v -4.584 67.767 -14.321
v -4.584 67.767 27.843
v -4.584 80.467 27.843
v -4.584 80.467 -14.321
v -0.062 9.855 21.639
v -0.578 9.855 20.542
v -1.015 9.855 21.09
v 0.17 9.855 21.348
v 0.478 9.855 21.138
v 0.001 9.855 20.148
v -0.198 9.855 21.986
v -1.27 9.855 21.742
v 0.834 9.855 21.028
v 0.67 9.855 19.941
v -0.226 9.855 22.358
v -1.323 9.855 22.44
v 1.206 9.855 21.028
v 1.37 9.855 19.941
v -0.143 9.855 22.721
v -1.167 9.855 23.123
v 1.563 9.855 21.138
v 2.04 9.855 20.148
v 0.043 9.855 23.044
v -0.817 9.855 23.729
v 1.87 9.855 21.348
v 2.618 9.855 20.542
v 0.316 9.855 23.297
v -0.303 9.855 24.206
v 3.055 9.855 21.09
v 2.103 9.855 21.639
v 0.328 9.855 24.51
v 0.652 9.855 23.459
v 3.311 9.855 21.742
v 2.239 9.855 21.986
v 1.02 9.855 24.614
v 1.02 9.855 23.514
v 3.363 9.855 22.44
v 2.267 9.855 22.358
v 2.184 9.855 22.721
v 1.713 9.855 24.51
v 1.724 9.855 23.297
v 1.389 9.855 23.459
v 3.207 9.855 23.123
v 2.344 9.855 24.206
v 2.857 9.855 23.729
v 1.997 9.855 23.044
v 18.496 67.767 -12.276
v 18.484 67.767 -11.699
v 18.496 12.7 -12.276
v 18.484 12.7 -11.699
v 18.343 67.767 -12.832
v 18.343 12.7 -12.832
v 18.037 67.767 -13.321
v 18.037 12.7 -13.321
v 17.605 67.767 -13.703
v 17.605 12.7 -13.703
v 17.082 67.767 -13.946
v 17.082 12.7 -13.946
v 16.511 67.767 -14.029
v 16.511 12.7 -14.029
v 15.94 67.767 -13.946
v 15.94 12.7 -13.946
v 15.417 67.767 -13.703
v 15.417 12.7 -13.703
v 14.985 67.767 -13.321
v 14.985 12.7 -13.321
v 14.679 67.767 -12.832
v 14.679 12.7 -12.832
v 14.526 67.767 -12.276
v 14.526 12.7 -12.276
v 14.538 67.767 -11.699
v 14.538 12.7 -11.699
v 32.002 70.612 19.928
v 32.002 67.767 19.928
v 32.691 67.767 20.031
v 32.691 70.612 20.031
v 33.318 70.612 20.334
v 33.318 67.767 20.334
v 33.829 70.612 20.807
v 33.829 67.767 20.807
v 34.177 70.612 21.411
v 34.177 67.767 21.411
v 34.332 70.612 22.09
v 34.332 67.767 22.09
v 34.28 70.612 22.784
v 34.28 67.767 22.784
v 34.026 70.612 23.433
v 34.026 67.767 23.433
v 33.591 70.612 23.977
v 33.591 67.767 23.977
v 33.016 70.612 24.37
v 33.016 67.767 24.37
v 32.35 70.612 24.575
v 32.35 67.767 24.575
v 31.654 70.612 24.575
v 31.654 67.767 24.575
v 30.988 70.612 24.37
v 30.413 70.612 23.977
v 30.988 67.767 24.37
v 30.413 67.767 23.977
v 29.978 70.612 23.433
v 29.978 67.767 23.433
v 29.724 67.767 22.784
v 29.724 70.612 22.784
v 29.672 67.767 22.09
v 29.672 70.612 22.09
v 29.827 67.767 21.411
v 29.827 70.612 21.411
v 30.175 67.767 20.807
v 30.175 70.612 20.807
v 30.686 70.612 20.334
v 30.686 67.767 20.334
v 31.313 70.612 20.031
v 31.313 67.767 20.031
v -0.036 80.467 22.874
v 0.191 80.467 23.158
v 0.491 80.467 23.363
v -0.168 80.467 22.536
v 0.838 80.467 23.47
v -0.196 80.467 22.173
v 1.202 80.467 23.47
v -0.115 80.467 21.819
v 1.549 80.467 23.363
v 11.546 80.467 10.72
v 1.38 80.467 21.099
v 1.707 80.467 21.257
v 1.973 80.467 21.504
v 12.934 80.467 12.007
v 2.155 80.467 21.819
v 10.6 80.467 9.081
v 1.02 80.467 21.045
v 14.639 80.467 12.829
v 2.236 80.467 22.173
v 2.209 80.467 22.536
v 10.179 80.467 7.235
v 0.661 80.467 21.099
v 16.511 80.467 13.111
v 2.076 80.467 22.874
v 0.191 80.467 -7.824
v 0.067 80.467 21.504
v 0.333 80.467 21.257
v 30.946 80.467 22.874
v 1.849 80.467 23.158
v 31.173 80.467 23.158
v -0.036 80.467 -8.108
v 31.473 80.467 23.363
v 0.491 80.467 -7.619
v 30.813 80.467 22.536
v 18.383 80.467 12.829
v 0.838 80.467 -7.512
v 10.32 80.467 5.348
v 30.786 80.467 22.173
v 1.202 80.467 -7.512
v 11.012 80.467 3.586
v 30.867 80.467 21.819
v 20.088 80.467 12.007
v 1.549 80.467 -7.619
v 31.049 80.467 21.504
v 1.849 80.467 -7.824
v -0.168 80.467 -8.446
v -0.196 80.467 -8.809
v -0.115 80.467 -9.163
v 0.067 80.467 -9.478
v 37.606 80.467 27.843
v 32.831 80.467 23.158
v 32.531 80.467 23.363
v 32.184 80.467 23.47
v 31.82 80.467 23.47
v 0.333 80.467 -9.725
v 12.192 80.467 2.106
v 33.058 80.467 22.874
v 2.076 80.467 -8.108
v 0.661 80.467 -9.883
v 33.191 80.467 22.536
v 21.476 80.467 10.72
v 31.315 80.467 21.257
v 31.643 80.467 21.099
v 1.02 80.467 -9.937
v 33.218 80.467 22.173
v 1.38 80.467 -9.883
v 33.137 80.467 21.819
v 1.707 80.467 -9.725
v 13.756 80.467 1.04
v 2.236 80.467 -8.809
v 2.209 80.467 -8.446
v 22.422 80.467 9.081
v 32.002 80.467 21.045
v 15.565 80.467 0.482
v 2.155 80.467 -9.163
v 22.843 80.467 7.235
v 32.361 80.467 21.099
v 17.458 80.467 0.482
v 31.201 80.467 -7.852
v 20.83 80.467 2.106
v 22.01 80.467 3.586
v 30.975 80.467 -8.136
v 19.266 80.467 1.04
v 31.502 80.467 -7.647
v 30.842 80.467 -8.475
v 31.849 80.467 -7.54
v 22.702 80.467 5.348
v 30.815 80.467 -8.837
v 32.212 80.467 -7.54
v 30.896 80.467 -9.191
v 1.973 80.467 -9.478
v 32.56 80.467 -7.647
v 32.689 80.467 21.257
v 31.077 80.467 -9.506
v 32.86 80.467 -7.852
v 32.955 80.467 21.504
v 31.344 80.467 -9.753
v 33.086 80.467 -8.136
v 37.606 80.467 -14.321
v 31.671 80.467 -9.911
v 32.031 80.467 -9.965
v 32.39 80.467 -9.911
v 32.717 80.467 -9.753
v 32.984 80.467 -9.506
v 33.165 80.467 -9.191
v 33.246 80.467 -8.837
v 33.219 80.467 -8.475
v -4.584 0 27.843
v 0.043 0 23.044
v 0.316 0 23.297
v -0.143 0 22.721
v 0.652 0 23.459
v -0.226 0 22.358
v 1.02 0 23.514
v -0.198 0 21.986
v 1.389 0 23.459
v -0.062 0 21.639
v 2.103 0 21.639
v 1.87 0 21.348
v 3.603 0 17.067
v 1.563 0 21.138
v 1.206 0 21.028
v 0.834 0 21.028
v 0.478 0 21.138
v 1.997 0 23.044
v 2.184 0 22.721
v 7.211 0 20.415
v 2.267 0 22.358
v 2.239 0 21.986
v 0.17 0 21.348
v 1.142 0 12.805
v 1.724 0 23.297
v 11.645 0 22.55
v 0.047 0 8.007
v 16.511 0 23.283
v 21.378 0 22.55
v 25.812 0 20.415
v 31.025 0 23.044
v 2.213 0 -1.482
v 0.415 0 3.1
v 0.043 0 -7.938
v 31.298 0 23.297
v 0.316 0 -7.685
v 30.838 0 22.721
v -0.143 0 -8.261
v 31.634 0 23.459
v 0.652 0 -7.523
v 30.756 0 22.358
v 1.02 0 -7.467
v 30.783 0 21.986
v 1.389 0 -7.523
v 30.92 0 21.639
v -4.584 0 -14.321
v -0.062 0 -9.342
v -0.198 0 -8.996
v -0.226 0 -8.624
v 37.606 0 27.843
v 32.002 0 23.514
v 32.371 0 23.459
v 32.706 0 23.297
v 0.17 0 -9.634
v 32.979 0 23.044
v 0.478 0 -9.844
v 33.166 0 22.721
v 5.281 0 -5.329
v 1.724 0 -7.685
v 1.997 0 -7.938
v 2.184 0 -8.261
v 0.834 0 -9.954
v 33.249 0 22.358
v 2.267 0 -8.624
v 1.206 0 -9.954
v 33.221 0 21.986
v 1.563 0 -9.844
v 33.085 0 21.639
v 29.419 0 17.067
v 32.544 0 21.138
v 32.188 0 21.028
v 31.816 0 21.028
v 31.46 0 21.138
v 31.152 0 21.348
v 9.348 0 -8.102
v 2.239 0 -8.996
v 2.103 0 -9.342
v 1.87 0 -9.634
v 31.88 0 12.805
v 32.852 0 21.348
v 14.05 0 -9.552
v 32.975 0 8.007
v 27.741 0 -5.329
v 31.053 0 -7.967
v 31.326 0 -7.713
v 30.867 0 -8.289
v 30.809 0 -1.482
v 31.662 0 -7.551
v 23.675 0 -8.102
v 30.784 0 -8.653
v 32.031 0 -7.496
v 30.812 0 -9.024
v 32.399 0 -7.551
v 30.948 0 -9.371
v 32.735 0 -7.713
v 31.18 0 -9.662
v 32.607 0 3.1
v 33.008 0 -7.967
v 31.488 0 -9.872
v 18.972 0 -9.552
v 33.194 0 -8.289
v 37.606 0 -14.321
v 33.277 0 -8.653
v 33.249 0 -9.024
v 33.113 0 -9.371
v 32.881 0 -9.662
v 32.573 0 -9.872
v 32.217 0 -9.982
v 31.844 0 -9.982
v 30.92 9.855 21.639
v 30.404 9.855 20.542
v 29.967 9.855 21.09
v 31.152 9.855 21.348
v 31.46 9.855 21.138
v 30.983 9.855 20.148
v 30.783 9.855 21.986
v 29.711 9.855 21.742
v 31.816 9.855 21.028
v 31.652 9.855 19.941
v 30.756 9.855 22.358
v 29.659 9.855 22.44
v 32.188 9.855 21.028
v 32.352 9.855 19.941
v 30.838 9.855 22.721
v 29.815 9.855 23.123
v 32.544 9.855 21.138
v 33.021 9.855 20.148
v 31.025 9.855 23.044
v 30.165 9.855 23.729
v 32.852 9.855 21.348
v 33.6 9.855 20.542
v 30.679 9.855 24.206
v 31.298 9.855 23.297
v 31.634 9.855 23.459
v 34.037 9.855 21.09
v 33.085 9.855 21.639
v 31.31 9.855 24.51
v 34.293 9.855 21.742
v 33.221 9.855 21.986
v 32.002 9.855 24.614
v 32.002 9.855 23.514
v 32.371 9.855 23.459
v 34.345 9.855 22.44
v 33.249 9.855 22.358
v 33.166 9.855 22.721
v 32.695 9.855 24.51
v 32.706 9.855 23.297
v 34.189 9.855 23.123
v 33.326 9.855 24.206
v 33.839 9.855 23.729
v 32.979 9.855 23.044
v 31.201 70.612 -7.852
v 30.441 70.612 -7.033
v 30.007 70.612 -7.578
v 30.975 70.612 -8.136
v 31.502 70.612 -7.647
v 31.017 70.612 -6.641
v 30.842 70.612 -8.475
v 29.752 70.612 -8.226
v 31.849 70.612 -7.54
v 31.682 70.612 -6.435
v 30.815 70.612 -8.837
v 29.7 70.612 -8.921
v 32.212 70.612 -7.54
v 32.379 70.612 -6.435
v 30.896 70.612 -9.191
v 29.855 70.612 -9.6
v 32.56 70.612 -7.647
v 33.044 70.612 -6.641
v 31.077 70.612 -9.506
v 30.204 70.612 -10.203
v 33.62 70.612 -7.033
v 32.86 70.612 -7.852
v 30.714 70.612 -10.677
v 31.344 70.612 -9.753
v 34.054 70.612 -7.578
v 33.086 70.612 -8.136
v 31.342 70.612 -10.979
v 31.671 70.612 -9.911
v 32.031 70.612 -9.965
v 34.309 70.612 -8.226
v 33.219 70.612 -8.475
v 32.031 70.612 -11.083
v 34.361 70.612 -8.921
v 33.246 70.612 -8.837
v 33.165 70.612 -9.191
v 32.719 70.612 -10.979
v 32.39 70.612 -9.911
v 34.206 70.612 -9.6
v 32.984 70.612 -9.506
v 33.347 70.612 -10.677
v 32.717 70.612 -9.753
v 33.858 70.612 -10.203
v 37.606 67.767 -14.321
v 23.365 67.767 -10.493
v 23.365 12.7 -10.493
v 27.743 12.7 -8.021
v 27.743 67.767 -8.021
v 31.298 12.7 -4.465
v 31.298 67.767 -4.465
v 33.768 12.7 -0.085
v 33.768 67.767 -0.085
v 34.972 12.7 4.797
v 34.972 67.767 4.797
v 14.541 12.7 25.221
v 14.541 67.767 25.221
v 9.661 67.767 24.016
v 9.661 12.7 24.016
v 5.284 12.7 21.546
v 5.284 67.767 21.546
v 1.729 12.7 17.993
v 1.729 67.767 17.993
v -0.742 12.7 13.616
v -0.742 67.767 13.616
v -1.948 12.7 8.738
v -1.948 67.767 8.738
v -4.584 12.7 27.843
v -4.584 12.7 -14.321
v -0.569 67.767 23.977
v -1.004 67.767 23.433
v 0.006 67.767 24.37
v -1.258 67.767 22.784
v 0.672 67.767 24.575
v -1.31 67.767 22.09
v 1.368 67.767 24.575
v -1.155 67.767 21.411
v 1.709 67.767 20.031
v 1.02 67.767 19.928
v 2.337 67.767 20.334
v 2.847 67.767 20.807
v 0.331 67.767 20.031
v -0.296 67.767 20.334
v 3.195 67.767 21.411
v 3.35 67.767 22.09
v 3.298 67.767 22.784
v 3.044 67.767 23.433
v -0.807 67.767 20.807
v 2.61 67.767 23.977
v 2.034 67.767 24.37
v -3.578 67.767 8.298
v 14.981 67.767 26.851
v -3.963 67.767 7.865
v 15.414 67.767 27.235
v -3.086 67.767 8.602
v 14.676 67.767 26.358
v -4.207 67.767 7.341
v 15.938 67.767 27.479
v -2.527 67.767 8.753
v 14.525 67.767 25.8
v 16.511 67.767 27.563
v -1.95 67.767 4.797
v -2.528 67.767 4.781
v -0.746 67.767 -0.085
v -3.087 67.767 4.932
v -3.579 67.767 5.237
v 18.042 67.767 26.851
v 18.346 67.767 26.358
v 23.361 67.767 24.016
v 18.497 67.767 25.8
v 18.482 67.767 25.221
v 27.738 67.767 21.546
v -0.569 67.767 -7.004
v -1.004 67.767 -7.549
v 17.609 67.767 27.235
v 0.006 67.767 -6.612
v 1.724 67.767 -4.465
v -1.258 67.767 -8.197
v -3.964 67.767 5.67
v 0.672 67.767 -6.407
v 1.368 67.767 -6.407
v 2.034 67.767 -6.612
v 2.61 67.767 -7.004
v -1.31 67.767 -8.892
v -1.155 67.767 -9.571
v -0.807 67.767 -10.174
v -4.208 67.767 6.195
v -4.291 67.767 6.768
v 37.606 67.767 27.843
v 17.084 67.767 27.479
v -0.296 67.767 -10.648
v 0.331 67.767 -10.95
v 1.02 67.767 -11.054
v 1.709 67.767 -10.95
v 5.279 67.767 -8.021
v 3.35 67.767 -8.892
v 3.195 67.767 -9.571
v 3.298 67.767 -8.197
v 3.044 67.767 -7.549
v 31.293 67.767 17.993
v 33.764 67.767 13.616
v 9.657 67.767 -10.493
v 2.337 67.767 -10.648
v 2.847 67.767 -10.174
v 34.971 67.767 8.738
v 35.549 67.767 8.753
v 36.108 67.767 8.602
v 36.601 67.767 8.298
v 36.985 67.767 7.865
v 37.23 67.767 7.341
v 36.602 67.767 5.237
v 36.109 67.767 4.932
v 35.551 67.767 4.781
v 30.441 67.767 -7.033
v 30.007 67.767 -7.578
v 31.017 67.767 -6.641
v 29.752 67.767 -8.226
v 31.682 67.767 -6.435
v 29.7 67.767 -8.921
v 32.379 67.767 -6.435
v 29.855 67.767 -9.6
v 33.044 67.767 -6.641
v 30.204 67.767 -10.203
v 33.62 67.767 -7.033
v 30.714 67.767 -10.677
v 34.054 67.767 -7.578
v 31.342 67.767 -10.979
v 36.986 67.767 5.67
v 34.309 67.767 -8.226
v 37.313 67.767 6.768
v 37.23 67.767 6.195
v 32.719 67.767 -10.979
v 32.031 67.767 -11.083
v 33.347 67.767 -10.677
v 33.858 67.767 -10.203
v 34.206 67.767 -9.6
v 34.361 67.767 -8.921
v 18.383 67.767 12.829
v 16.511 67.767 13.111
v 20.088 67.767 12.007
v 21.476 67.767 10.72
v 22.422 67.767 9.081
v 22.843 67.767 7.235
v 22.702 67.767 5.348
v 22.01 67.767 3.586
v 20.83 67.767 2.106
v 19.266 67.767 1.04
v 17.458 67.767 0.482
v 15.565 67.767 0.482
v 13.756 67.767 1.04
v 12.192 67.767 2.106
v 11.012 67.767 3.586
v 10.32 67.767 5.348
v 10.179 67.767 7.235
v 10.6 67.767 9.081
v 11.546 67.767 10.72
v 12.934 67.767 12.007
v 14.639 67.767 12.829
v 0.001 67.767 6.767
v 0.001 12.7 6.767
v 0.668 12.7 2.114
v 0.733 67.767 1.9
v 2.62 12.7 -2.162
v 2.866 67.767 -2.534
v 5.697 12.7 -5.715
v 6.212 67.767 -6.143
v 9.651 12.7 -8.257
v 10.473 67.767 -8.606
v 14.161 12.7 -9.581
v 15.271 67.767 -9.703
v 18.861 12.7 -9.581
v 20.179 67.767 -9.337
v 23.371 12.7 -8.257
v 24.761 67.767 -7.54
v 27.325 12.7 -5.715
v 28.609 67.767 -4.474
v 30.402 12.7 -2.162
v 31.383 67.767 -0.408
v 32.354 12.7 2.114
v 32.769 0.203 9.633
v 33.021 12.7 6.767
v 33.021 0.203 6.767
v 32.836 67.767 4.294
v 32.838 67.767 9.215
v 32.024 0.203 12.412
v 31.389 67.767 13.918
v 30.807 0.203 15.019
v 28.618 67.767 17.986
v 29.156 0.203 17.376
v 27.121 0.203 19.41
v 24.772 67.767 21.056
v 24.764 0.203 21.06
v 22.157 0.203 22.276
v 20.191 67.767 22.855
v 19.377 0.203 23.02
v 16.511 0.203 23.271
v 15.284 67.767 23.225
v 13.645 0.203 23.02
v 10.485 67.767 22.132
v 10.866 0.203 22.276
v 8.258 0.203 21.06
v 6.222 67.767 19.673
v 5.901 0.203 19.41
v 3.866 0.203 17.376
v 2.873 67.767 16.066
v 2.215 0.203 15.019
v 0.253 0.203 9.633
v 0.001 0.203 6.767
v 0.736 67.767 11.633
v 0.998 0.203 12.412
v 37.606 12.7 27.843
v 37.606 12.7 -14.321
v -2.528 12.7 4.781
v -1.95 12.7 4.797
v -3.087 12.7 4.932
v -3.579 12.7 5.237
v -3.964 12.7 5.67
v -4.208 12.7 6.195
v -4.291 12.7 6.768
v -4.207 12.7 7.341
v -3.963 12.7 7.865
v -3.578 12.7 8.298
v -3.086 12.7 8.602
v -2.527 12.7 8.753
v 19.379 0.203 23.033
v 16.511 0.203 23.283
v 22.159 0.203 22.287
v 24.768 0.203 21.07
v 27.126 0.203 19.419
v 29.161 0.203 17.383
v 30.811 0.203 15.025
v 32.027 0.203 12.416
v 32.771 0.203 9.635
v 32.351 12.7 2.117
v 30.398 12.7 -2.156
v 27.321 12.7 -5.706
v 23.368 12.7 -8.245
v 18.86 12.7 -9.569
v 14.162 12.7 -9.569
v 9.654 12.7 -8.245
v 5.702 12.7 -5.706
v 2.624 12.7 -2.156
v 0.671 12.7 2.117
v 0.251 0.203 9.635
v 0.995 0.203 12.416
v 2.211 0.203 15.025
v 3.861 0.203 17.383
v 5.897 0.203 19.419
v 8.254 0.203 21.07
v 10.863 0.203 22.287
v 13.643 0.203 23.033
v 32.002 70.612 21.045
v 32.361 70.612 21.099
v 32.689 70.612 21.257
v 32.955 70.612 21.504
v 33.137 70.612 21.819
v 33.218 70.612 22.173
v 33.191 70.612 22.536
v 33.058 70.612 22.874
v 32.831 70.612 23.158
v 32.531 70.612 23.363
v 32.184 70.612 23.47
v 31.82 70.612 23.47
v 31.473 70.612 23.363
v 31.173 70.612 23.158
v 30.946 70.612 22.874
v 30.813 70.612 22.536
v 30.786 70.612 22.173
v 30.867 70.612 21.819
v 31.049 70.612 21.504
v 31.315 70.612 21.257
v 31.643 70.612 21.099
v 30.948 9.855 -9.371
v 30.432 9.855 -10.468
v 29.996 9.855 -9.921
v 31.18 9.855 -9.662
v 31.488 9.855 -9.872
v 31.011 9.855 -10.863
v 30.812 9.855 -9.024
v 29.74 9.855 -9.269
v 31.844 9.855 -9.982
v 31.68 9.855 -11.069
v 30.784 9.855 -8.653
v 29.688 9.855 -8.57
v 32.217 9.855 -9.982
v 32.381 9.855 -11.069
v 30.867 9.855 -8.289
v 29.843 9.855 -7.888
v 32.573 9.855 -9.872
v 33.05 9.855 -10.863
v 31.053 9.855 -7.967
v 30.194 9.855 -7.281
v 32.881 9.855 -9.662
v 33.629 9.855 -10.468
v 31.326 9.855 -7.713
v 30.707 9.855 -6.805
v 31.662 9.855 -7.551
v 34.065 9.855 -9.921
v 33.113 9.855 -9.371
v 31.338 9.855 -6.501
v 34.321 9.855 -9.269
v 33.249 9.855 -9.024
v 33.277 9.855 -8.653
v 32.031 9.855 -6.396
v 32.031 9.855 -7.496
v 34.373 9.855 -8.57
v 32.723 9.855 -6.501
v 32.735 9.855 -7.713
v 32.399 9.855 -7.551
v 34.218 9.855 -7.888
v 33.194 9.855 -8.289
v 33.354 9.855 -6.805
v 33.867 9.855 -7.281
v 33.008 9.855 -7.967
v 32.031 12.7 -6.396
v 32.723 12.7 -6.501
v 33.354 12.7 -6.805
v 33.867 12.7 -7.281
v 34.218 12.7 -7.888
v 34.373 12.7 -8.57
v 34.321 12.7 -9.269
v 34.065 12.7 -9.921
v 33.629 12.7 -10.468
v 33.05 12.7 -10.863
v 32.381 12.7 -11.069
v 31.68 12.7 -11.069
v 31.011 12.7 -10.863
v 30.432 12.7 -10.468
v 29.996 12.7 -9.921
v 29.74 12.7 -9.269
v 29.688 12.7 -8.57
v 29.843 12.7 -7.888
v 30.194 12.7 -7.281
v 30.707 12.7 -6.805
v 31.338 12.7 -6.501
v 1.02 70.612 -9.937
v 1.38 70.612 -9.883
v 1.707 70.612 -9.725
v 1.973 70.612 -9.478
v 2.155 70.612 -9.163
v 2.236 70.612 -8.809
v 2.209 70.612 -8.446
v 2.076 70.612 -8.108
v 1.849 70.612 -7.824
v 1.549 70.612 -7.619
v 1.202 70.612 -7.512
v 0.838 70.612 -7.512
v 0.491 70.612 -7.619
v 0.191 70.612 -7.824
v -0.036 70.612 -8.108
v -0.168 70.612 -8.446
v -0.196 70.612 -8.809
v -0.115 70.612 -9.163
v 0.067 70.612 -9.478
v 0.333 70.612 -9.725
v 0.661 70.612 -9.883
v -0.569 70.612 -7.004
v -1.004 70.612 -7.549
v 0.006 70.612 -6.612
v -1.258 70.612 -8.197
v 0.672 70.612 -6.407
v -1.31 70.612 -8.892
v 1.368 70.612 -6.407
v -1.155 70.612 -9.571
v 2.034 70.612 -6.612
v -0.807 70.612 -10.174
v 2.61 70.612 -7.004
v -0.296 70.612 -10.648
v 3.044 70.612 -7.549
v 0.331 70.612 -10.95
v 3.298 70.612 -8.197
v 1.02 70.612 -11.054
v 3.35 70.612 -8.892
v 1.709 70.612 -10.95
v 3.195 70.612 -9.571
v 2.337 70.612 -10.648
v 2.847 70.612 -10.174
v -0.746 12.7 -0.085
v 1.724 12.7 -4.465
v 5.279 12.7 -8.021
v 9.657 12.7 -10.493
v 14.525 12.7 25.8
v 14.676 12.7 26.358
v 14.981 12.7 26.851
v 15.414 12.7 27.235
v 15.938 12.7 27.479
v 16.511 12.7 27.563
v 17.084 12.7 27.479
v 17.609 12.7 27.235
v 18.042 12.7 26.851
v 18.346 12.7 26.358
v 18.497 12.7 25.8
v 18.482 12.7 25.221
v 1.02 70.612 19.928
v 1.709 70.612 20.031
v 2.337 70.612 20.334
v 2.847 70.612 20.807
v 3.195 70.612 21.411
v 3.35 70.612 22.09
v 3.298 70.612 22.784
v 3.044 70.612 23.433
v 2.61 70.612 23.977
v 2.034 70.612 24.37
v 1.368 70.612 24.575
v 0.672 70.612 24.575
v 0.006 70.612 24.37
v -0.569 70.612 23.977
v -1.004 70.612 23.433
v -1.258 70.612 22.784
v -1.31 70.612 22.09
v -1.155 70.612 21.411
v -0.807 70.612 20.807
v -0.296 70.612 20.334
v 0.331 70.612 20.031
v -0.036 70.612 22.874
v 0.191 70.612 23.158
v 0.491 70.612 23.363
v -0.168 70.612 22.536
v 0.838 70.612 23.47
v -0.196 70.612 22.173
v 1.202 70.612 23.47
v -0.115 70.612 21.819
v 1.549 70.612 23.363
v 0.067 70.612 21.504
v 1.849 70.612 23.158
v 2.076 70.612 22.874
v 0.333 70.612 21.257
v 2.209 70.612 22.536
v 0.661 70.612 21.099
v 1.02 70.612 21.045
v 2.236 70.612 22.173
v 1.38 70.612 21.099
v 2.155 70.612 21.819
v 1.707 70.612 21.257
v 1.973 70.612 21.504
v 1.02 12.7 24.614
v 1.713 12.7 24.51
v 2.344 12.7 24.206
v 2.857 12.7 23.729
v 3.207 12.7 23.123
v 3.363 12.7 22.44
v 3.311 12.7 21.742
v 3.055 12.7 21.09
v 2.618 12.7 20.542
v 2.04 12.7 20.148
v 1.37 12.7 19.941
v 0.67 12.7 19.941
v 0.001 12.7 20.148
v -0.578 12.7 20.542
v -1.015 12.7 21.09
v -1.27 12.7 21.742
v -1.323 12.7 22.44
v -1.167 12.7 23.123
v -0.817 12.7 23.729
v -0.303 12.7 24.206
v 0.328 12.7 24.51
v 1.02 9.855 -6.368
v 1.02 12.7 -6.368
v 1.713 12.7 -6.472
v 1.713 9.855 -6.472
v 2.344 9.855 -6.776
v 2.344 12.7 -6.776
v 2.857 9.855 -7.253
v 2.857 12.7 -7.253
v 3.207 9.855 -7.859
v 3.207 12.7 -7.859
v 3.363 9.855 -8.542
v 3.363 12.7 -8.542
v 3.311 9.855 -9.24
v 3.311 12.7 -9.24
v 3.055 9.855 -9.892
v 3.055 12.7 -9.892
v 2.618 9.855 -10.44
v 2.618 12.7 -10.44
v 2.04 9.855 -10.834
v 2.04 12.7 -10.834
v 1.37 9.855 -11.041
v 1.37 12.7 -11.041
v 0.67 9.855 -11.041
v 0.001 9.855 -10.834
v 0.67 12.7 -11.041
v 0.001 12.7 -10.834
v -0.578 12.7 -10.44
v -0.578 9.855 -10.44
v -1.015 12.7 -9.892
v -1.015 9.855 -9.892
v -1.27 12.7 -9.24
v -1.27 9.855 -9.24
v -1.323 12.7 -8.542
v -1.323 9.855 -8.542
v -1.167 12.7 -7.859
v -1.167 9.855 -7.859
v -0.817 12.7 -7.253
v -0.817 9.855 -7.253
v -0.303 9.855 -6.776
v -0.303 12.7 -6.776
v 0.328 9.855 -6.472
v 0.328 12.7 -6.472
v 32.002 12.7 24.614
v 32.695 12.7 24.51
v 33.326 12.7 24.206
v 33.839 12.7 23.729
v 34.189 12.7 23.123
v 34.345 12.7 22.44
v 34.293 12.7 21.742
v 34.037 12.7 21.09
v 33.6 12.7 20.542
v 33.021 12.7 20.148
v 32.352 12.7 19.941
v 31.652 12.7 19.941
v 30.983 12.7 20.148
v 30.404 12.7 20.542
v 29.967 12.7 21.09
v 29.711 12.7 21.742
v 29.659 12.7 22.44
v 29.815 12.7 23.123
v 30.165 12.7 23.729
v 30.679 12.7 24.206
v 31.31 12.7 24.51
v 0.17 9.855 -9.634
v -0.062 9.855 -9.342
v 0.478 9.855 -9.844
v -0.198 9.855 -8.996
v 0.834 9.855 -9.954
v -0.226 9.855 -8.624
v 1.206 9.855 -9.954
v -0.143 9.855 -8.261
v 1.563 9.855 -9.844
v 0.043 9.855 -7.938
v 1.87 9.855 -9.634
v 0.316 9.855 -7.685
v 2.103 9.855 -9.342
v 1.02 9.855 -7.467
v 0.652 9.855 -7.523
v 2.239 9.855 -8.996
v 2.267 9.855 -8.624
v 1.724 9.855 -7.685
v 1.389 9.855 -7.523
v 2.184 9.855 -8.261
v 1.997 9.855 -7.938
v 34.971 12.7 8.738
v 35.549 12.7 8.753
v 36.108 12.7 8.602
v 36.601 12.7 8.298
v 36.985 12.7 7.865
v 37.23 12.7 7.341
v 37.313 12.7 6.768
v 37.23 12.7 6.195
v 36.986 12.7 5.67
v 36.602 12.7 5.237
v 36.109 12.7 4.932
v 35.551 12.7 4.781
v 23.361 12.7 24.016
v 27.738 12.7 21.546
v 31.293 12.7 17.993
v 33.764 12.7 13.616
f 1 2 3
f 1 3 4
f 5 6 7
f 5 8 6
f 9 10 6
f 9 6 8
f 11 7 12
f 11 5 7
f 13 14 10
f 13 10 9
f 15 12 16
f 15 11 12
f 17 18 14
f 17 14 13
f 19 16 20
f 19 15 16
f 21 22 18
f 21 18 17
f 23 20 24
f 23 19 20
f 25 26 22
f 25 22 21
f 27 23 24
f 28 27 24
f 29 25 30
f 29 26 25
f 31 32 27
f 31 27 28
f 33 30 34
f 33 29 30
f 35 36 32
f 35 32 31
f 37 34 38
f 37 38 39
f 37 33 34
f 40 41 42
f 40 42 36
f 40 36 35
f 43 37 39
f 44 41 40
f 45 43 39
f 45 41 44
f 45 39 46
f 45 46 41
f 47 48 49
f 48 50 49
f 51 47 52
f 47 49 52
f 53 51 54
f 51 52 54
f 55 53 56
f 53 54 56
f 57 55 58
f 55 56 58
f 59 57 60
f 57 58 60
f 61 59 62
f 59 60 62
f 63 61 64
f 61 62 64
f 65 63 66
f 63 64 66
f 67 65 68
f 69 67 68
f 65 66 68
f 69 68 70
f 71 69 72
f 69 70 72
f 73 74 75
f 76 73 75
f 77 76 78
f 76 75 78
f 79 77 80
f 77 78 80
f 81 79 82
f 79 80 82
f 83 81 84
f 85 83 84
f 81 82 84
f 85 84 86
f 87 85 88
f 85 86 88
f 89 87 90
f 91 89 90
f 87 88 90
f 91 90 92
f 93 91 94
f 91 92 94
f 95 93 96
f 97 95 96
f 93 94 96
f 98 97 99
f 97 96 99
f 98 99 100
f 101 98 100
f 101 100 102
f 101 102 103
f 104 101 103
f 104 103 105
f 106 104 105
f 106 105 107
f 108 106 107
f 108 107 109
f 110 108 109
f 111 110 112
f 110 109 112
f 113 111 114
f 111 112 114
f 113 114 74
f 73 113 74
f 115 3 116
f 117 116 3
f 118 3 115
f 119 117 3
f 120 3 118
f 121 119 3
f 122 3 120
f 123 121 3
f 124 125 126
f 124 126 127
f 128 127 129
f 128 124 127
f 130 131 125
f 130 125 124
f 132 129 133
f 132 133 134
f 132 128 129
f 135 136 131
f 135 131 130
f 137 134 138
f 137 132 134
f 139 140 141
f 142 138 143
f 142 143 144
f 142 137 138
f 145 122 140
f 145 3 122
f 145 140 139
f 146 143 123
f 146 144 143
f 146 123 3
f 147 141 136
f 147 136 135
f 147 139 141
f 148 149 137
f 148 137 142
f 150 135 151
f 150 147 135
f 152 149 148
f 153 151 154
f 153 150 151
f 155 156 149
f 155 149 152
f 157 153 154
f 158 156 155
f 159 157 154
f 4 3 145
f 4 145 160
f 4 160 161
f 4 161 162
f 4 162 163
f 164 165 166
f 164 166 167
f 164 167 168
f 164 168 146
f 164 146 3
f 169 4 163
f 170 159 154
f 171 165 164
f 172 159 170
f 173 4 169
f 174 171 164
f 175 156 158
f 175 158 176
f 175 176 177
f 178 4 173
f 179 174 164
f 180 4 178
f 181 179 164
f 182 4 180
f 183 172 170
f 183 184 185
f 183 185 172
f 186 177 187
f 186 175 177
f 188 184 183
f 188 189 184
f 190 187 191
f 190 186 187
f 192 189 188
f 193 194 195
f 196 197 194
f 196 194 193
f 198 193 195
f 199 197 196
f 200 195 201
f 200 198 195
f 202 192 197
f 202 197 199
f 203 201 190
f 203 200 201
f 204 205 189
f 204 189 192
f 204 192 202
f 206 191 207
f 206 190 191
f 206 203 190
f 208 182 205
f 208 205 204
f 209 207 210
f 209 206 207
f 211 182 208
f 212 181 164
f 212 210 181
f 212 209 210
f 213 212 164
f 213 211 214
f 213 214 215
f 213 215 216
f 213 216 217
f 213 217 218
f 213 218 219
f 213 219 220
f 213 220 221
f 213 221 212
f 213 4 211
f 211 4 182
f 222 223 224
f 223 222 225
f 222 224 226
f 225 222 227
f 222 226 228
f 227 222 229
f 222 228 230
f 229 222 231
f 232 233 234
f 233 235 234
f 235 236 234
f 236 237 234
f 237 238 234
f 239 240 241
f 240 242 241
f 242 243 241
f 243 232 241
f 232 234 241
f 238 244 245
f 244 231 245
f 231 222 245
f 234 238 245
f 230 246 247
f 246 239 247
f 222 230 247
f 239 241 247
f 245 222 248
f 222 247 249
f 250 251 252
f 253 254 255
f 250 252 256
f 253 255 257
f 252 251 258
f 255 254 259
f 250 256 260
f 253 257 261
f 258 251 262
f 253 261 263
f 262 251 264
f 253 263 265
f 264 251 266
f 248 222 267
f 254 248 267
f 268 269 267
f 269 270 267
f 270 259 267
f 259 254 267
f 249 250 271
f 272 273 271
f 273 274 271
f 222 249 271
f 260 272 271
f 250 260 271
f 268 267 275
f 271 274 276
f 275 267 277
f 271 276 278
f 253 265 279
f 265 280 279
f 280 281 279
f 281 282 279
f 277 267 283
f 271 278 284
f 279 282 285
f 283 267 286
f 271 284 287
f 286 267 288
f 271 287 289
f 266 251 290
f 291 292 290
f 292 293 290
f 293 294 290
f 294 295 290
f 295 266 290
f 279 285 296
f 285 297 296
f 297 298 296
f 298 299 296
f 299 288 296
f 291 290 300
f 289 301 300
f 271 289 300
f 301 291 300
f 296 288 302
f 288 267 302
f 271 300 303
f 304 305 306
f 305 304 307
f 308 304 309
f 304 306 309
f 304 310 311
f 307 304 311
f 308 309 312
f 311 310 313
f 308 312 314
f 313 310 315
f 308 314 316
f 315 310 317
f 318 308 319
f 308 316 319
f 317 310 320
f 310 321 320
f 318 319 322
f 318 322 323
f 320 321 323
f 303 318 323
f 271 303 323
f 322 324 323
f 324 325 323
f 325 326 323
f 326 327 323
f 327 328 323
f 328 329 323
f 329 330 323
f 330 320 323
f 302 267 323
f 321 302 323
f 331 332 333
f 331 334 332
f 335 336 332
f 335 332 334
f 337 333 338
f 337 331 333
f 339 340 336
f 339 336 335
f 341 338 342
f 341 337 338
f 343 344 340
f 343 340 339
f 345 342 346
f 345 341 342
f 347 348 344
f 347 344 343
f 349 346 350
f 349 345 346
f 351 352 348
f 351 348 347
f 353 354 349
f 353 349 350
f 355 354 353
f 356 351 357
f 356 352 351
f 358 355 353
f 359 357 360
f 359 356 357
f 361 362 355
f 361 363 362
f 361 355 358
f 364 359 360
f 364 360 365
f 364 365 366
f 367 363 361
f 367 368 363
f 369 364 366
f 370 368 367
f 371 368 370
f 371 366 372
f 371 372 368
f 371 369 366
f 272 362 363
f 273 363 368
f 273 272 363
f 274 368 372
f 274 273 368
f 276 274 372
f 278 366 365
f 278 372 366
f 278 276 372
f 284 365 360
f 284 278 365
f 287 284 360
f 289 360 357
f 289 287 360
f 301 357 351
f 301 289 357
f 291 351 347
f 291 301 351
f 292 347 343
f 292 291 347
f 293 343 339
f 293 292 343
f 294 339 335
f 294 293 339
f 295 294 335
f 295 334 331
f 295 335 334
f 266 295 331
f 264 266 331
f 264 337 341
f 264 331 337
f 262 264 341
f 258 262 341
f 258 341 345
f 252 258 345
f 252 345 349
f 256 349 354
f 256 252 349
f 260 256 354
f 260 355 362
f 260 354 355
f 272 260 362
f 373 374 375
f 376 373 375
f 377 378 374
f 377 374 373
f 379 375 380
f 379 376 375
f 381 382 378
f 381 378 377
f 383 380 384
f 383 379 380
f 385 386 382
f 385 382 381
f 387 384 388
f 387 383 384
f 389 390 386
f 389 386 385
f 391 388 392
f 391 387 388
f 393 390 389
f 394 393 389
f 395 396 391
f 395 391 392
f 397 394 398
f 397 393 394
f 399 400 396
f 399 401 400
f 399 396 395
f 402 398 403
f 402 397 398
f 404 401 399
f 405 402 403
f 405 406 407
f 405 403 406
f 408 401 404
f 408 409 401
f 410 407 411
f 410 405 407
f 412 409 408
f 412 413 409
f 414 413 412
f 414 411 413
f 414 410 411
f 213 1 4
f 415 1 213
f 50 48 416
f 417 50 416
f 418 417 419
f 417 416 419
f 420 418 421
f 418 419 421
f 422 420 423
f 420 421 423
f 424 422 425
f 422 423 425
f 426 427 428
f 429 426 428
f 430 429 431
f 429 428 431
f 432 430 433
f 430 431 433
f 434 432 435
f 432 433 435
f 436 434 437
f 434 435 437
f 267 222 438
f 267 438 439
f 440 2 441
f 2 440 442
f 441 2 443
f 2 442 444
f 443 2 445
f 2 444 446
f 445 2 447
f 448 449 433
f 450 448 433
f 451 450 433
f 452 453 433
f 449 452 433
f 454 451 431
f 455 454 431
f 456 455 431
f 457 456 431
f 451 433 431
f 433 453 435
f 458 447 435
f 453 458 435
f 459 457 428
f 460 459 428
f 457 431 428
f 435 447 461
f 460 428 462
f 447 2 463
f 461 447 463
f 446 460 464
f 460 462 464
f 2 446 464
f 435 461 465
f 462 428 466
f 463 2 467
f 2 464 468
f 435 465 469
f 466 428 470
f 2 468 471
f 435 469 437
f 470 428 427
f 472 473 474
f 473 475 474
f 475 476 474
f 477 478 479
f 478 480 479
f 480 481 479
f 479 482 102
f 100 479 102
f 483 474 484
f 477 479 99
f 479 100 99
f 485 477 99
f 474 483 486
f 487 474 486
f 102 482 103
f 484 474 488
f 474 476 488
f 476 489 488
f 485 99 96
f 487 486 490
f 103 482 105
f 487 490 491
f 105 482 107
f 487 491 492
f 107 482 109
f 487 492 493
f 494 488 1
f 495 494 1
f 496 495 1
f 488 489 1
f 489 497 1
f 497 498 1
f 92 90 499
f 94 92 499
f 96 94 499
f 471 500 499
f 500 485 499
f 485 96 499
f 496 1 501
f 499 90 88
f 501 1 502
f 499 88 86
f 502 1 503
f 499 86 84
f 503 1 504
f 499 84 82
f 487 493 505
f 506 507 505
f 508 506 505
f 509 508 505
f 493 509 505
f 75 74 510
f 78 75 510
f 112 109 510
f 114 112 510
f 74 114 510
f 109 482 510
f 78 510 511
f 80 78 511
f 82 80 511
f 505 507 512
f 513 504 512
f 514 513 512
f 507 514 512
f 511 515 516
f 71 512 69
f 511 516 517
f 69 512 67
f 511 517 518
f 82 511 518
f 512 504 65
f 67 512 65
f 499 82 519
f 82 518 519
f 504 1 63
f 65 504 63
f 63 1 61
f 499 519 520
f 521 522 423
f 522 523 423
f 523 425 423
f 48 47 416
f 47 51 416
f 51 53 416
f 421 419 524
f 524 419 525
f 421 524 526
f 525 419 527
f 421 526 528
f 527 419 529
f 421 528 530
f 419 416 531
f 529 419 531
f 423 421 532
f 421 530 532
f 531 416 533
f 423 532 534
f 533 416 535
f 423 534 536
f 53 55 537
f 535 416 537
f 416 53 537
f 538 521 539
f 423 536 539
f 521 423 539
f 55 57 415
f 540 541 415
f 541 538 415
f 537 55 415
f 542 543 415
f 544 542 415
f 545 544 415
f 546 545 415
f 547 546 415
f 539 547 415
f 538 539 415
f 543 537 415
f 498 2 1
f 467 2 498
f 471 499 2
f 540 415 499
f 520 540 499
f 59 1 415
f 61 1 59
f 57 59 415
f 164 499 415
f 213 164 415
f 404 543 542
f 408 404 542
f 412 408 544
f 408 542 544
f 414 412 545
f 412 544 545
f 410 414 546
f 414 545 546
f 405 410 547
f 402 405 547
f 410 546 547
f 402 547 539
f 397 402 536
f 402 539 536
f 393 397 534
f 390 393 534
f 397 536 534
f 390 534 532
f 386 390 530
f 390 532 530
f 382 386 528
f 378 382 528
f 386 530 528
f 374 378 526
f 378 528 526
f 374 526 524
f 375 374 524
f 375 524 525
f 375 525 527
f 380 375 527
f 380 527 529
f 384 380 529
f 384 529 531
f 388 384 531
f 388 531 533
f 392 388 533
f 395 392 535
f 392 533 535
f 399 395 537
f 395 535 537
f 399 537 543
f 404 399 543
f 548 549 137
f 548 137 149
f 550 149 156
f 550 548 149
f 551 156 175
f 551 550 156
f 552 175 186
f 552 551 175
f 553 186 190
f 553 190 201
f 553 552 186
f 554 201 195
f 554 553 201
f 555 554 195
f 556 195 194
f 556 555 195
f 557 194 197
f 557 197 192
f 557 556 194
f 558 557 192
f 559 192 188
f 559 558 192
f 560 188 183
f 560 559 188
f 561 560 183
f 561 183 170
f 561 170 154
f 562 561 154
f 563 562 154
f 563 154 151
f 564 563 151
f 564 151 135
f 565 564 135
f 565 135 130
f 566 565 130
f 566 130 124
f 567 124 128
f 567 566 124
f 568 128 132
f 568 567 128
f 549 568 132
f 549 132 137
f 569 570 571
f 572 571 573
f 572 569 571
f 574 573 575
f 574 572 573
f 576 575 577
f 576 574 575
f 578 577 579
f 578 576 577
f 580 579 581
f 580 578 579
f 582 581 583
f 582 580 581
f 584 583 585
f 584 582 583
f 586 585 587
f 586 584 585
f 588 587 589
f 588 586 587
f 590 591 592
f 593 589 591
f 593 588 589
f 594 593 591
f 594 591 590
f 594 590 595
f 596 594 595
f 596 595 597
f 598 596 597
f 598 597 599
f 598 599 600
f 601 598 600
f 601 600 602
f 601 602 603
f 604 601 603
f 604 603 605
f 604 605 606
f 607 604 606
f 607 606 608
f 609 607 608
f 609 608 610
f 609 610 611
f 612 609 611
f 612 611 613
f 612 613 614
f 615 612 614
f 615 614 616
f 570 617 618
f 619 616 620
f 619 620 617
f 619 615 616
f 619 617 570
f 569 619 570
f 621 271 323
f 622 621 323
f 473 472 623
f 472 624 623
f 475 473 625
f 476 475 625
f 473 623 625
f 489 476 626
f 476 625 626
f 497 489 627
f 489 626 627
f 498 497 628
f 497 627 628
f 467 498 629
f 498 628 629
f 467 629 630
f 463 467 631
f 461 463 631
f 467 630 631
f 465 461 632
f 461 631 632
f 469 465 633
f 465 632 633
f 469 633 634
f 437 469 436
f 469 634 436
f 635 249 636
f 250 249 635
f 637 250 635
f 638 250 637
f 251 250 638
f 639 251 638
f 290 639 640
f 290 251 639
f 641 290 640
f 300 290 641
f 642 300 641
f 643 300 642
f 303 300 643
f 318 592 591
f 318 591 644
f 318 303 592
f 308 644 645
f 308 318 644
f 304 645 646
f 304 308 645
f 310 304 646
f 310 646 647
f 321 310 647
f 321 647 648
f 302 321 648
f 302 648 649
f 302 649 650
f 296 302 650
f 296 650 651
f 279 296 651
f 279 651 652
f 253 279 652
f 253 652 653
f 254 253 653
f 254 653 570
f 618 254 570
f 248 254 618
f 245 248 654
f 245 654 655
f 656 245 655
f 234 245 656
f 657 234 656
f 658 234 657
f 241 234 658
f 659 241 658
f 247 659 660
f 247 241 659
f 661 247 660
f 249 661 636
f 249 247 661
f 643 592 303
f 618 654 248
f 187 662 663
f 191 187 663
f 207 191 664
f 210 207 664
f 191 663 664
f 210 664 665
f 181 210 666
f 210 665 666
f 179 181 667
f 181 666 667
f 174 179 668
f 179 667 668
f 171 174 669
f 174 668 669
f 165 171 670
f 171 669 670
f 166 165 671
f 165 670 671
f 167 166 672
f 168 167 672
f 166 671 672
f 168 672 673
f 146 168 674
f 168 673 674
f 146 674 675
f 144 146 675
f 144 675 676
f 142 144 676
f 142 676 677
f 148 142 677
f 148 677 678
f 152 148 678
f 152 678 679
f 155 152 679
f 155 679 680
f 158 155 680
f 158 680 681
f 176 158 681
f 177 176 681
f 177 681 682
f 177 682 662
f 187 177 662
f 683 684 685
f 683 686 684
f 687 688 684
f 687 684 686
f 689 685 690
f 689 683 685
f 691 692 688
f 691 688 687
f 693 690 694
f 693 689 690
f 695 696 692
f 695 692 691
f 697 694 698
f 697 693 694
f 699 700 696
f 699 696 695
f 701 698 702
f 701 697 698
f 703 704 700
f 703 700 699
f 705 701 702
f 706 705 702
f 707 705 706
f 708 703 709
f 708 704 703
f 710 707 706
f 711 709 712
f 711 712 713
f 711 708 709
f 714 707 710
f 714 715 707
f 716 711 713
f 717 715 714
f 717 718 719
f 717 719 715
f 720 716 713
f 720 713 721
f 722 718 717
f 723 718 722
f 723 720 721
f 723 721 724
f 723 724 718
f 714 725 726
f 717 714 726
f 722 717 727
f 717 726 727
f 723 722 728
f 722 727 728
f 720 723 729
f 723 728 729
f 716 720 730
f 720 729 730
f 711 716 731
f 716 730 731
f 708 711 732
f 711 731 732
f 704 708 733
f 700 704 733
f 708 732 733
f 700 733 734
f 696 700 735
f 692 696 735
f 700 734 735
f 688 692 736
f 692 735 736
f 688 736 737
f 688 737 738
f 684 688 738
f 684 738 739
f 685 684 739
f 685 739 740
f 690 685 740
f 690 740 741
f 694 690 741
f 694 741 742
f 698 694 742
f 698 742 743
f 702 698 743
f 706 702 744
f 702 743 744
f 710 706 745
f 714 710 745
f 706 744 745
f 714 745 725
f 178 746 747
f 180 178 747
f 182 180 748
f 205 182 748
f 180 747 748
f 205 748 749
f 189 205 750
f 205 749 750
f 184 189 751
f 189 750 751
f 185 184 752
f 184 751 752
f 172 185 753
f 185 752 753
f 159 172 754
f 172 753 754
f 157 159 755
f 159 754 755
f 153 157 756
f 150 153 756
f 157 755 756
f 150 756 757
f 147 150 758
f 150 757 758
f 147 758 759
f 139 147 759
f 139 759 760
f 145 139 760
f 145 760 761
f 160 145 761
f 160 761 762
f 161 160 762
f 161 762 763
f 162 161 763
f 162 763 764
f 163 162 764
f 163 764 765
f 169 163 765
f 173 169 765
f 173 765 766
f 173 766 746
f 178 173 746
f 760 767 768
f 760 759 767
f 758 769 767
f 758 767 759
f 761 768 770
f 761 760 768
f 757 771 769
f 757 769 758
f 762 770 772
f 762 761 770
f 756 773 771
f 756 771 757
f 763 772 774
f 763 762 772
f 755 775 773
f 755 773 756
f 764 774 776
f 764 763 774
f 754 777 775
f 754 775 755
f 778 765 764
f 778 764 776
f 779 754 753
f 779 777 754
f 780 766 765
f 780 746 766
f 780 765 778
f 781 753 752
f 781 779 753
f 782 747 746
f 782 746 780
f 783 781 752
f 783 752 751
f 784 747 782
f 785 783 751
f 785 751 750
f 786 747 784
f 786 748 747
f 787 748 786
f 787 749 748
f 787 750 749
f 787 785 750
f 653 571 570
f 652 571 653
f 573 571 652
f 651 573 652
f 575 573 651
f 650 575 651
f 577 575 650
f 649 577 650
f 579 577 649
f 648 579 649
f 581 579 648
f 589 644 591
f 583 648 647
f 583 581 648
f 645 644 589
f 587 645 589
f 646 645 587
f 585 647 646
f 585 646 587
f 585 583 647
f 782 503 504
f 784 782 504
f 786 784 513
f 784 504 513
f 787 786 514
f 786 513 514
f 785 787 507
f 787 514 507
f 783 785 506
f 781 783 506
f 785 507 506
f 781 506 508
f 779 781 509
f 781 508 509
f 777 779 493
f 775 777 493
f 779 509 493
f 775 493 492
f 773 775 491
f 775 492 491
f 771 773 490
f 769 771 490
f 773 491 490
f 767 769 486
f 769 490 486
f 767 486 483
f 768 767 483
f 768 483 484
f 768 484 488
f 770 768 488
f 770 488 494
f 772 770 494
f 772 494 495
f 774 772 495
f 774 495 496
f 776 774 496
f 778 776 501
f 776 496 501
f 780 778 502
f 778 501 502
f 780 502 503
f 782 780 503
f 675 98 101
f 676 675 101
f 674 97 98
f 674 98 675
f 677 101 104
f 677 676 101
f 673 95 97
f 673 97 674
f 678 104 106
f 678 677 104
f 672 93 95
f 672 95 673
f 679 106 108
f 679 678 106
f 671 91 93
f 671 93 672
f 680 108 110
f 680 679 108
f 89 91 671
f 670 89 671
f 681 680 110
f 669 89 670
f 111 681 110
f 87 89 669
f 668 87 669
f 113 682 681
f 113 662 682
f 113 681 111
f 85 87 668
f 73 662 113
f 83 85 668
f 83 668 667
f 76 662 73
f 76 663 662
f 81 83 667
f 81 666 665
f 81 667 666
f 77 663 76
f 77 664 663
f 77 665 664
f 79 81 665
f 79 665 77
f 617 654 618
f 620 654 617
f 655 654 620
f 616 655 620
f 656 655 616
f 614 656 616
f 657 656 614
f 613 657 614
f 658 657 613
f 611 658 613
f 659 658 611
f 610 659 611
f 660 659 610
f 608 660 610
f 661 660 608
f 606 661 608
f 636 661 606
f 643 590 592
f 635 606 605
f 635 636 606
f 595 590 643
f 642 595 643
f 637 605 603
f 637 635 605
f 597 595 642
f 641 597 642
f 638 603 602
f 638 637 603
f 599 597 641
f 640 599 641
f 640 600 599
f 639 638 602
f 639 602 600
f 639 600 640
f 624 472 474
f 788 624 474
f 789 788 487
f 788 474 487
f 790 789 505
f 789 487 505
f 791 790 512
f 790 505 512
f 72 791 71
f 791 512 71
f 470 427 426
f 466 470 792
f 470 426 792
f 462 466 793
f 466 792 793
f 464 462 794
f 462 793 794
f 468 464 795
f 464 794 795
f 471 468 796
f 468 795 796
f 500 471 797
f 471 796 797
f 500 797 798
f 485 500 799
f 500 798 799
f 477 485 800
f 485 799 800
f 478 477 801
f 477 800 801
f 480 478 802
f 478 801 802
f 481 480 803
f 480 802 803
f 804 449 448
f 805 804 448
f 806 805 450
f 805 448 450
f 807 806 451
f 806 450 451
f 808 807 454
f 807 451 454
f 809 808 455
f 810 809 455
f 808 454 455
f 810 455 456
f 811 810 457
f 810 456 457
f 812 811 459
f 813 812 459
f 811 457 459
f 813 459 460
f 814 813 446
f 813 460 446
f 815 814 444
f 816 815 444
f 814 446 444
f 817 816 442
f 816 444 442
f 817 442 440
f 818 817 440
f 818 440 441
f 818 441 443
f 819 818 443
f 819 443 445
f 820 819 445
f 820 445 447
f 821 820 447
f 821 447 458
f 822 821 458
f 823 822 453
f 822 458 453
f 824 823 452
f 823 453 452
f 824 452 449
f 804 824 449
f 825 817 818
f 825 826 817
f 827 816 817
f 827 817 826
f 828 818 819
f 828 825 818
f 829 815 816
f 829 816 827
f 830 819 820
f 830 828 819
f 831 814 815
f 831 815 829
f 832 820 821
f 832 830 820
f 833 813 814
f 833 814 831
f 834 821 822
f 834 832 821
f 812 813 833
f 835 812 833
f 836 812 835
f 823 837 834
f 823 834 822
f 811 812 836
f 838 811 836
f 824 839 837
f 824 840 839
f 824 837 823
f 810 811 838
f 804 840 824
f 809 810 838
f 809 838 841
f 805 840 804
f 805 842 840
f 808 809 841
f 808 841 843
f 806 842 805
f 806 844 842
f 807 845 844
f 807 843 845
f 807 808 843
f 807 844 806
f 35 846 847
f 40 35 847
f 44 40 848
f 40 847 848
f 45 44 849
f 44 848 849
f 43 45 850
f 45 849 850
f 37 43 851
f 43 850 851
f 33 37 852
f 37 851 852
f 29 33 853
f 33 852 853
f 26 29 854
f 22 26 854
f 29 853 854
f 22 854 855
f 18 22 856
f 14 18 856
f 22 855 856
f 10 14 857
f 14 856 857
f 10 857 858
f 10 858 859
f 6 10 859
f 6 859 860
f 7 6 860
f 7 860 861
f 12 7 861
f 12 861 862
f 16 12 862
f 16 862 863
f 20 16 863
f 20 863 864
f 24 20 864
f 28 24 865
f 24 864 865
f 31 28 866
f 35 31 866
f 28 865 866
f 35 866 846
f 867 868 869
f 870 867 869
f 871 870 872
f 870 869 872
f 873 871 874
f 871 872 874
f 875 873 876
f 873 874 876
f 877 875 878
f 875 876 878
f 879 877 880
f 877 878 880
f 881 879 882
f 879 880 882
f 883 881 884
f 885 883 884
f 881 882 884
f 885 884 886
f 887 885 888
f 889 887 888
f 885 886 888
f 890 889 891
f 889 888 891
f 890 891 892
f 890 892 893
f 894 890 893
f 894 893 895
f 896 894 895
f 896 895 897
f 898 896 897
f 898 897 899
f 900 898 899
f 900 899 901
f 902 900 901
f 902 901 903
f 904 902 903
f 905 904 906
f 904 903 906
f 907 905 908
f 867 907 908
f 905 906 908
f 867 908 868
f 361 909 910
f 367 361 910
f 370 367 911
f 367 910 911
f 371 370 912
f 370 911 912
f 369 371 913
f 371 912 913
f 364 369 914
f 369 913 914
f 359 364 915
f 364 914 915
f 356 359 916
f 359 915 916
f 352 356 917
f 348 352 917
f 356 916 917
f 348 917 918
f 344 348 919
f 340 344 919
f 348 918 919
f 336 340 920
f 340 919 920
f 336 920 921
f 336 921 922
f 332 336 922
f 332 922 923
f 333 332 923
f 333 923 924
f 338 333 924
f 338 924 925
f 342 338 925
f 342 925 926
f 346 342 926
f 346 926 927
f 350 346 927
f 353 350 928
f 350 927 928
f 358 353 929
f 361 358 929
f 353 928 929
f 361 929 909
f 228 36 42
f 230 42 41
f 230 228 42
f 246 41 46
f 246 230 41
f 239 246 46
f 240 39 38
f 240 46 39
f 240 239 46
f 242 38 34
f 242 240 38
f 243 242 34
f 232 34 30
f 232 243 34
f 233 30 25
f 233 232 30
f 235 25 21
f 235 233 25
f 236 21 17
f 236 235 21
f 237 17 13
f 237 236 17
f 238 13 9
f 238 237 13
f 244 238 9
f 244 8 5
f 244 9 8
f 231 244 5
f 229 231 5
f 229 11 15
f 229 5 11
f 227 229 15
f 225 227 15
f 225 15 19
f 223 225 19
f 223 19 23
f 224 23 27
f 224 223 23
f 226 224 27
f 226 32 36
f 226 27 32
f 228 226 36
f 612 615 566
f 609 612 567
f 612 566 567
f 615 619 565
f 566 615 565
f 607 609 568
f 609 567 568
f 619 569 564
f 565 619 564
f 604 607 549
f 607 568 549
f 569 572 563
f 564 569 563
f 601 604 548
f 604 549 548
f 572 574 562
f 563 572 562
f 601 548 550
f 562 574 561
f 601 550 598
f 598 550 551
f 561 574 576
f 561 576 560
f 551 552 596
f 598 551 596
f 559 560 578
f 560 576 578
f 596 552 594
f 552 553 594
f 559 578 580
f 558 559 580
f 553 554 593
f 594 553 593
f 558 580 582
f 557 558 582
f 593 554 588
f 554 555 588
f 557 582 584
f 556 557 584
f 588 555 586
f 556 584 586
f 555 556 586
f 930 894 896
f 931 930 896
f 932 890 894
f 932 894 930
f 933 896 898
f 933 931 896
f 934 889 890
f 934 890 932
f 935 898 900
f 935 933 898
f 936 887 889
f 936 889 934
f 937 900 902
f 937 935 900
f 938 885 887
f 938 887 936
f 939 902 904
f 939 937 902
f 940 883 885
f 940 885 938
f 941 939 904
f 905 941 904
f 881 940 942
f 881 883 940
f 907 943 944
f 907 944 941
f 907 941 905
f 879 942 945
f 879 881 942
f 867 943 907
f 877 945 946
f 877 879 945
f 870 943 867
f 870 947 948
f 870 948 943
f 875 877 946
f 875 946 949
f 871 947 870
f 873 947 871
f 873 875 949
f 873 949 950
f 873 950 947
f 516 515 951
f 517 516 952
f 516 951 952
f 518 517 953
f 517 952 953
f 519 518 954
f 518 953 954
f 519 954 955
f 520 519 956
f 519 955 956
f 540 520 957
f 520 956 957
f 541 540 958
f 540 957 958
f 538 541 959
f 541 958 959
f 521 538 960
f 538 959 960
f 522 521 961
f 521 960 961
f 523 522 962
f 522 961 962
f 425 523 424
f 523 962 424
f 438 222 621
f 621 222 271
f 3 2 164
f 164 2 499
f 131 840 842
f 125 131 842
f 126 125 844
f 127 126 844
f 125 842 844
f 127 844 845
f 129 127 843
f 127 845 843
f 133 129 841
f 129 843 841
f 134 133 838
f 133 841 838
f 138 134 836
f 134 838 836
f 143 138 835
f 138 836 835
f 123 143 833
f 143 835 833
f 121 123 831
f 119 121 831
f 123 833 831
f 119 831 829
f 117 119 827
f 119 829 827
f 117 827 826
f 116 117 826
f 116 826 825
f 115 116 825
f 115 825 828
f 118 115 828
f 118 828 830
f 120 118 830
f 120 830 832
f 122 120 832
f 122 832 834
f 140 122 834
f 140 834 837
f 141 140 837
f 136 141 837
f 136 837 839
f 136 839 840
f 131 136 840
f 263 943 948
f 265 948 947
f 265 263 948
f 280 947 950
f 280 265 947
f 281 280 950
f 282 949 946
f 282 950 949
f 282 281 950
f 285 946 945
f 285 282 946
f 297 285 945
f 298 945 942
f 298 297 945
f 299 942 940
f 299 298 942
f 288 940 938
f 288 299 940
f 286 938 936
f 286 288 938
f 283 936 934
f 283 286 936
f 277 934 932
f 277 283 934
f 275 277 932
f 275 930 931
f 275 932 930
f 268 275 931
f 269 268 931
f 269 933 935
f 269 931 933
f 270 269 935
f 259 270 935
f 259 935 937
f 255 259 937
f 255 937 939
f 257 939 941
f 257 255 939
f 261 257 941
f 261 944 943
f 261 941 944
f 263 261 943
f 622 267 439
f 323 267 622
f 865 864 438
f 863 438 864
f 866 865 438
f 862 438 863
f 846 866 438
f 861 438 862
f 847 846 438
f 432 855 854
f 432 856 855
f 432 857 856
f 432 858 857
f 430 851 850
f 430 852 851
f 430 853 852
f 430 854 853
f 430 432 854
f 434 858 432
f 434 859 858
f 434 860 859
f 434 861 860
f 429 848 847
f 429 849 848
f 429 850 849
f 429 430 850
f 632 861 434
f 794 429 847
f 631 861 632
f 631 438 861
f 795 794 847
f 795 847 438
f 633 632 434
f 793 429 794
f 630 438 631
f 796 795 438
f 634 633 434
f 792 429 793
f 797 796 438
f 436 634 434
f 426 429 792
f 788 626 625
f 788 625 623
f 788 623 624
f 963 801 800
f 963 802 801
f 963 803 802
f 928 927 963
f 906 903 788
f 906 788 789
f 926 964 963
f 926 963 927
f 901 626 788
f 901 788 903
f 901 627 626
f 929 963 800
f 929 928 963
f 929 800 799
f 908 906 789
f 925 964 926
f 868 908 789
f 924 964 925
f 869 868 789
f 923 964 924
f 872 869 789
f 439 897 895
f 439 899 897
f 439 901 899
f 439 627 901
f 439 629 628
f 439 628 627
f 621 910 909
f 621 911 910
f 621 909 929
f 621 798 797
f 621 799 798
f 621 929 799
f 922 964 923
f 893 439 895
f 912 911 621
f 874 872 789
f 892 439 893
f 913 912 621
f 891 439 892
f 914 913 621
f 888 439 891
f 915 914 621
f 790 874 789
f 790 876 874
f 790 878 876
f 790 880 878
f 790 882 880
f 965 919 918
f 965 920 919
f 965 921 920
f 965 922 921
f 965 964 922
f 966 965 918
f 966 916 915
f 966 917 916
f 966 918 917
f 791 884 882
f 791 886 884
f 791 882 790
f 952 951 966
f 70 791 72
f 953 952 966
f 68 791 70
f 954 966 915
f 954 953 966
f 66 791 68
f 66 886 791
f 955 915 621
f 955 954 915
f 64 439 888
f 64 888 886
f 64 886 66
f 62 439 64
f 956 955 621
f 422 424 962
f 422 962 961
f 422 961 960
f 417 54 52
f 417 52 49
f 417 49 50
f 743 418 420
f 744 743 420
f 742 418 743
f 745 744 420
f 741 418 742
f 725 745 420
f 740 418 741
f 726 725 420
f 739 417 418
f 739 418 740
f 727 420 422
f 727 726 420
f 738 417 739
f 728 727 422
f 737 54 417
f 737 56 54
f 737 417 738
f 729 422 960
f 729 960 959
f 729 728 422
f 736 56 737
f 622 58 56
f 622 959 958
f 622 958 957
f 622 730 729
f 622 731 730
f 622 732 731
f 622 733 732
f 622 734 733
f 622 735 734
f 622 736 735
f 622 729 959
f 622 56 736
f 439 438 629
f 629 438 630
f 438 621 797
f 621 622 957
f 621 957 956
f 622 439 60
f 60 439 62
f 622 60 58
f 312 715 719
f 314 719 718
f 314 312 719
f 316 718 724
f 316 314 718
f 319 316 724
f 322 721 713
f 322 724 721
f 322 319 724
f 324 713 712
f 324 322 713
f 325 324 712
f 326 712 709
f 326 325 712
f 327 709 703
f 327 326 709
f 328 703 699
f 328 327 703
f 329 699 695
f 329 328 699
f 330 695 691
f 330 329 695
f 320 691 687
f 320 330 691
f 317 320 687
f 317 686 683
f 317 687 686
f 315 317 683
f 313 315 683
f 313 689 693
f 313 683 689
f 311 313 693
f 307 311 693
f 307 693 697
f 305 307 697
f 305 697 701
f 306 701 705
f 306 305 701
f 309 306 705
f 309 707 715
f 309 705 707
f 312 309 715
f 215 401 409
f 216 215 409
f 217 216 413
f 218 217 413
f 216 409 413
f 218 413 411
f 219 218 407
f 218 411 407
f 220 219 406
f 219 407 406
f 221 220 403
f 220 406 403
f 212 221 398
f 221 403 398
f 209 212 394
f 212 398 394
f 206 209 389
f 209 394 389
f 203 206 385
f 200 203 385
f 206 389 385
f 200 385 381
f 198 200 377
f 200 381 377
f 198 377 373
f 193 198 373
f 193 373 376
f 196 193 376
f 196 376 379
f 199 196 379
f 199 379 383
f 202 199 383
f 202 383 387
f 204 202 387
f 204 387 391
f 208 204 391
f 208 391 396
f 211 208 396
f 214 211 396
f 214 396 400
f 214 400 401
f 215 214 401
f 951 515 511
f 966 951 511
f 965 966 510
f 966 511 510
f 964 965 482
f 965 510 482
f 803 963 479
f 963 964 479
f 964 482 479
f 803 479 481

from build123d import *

# Parameters (mm, degrees)
SKETCH1_W           = 42.1894
SKETCH1_H           = 42.164
SKETCH1_R           = 16.51
SKETCH1_R_2         = 1.25
BOSS_EXTRUDE1_DEPTH = 12.7
SKETCH2_R           = 2
BOSS_EXTRUDE2_DEPTH = 55.0672
SKETCH3_W           = 42.1894
SKETCH3_H           = 42.164
SKETCH3_R           = 6.35
BOSS_EXTRUDE3_DEPTH = 12.7
SKETCH4_R           = 1.2192
CUT_EXTRUDE1_DEPTH  = 94.082694186
SKETCH5_R           = 2.3495
CUT_EXTRUDE2_DEPTH  = 2.8448
SKETCH7_R           = 2.3368
CUT_EXTRUDE3_DEPTH  = 2.8448
SKETCH8_R           = 18.565
SKETCH8_R_2         = 16.51
BOSS_EXTRUDE5_DEPTH = 67.564


with BuildPart() as part:
    # Sketch1 → Boss-Extrude1 (new body)
    with BuildSketch(Plane(origin=(0, 0, 0), x_dir=(1, 0, 0), z_dir=(0, 1, 0))):
        with Locations((16.511120943, -6.760771275)):
            Rectangle(SKETCH1_W, SKETCH1_H)
        with Locations(Location((16.511120943, -6.773471275, 0), (0, 0, 270))):
            Circle(SKETCH1_R, mode=Mode.SUBTRACT)
        with Locations(Location((32.030520943, 8.745928725, 0), (0, 0, 270))):
            Circle(SKETCH1_R_2, mode=Mode.SUBTRACT)
        with Locations(Location((1.020179134, 8.717470534, 0), (0, 0, 270))):
            Circle(SKETCH1_R_2, mode=Mode.SUBTRACT)
        with Locations(Location((1.020179134, -22.264413084, 0), (0, 0, 270))):
            Circle(SKETCH1_R_2, mode=Mode.SUBTRACT)
        with Locations(Location((32.002062752, -22.264413084, 0), (0, 0, 270))):
            Circle(SKETCH1_R_2, mode=Mode.SUBTRACT)
    extrude(amount=BOSS_EXTRUDE1_DEPTH)

    # Sketch2 → Boss-Extrude2 (add)
    with BuildSketch(Plane(origin=(0, 12.7, 0), x_dir=(1, 0, 0), z_dir=(0, 1, 0))):
        with Locations(Location((16.511120943, 12.028878725, 0), (0, 0, 90))):
            Circle(SKETCH2_R)
        with Locations(Location((-2.291229057, -6.767121275, 0), (0, 0, 90))):
            Circle(SKETCH2_R)
        with Locations(Location((35.313470943, -6.767121275, 0), (0, 0, 90))):
            Circle(SKETCH2_R)
        with Locations(Location((16.511120943, -25.563121275, 0), (0, 0, 90))):
            Circle(SKETCH2_R)
    extrude(amount=BOSS_EXTRUDE2_DEPTH)

    # Sketch3 → Boss-Extrude3 (add)
    with BuildSketch(Plane(origin=(0, 67.7672, 0), x_dir=(1, 0, 0), z_dir=(0, 1, 0))):
        with Locations((16.511120943, -6.760771275)):
            Rectangle(SKETCH3_W, SKETCH3_H)
        with Locations(Location((16.511120943, -6.760771275, 0), (0, 0, 270))):
            Circle(SKETCH3_R, mode=Mode.SUBTRACT)
    extrude(amount=BOSS_EXTRUDE3_DEPTH)

    # Sketch4 → Cut-Extrude1 (cut, through all)
    with BuildSketch(Plane.XZ):
        with Locations(Location((1.020179134, 22.264413084, 0), (0, 0, 270))):
            Circle(SKETCH4_R)
        with Locations(Location((1.020179134, -8.717470534, 0), (0, 0, 270))):
            Circle(SKETCH4_R)
        with Locations(Location((32.030520943, -8.745928725, 0), (0, 0, 270))):
            Circle(SKETCH4_R)
        with Locations(Location((32.002062752, 22.264413084, 0), (0, 0, 270))):
            Circle(SKETCH4_R)
    extrude(amount=-CUT_EXTRUDE1_DEPTH, mode=Mode.SUBTRACT)

    # Sketch5 → Cut-Extrude2 (cut)
    with BuildSketch(Plane(origin=(0, 12.7, 0), x_dir=(1, 0, 0), z_dir=(0, 1, 0))):
        with Locations(Location((32.002062752, -22.264413084, 0), (0, 0, 270))):
            Circle(SKETCH5_R)
        with Locations(Location((1.020179134, -22.264413084, 0), (0, 0, 270))):
            Circle(SKETCH5_R)
        with Locations(Location((32.030520943, 8.745928725, 0), (0, 0, 270))):
            Circle(SKETCH5_R)
        with Locations(Location((1.020179134, 8.717470534, 0), (0, 0, 270))):
            Circle(SKETCH5_R)
    extrude(amount=-CUT_EXTRUDE2_DEPTH, mode=Mode.SUBTRACT)

    # Sketch7 → Cut-Extrude3 (cut)
    with BuildSketch(Plane.XZ.offset(-67.7672)):
        with Locations(Location((32.030520943, -8.745928725, 0), (0, 0, 270))):
            Circle(SKETCH7_R)
        with Locations(Location((32.002062752, 22.264413084, 0), (0, 0, 270))):
            Circle(SKETCH7_R)
        with Locations(Location((1.020179134, -8.717470534, 0), (0, 0, 270))):
            Circle(SKETCH7_R)
        with Locations(Location((1.020179134, 22.264413084, 0), (0, 0, 270))):
            Circle(SKETCH7_R)
    extrude(amount=-CUT_EXTRUDE3_DEPTH, mode=Mode.SUBTRACT)

    # Sketch8 → Boss-Extrude5 (add)
    with BuildSketch(Plane.XZ.offset(-67.7672)):
        with Locations((16.511120943, 6.760771275)):
            Circle(SKETCH8_R)
        with Locations(Location((16.511120943, 6.760771275, 0), (0, 0, 179.977963161))):
            Circle(SKETCH8_R_2, mode=Mode.SUBTRACT)
    extrude(amount=BOSS_EXTRUDE5_DEPTH)


solid = part.part
